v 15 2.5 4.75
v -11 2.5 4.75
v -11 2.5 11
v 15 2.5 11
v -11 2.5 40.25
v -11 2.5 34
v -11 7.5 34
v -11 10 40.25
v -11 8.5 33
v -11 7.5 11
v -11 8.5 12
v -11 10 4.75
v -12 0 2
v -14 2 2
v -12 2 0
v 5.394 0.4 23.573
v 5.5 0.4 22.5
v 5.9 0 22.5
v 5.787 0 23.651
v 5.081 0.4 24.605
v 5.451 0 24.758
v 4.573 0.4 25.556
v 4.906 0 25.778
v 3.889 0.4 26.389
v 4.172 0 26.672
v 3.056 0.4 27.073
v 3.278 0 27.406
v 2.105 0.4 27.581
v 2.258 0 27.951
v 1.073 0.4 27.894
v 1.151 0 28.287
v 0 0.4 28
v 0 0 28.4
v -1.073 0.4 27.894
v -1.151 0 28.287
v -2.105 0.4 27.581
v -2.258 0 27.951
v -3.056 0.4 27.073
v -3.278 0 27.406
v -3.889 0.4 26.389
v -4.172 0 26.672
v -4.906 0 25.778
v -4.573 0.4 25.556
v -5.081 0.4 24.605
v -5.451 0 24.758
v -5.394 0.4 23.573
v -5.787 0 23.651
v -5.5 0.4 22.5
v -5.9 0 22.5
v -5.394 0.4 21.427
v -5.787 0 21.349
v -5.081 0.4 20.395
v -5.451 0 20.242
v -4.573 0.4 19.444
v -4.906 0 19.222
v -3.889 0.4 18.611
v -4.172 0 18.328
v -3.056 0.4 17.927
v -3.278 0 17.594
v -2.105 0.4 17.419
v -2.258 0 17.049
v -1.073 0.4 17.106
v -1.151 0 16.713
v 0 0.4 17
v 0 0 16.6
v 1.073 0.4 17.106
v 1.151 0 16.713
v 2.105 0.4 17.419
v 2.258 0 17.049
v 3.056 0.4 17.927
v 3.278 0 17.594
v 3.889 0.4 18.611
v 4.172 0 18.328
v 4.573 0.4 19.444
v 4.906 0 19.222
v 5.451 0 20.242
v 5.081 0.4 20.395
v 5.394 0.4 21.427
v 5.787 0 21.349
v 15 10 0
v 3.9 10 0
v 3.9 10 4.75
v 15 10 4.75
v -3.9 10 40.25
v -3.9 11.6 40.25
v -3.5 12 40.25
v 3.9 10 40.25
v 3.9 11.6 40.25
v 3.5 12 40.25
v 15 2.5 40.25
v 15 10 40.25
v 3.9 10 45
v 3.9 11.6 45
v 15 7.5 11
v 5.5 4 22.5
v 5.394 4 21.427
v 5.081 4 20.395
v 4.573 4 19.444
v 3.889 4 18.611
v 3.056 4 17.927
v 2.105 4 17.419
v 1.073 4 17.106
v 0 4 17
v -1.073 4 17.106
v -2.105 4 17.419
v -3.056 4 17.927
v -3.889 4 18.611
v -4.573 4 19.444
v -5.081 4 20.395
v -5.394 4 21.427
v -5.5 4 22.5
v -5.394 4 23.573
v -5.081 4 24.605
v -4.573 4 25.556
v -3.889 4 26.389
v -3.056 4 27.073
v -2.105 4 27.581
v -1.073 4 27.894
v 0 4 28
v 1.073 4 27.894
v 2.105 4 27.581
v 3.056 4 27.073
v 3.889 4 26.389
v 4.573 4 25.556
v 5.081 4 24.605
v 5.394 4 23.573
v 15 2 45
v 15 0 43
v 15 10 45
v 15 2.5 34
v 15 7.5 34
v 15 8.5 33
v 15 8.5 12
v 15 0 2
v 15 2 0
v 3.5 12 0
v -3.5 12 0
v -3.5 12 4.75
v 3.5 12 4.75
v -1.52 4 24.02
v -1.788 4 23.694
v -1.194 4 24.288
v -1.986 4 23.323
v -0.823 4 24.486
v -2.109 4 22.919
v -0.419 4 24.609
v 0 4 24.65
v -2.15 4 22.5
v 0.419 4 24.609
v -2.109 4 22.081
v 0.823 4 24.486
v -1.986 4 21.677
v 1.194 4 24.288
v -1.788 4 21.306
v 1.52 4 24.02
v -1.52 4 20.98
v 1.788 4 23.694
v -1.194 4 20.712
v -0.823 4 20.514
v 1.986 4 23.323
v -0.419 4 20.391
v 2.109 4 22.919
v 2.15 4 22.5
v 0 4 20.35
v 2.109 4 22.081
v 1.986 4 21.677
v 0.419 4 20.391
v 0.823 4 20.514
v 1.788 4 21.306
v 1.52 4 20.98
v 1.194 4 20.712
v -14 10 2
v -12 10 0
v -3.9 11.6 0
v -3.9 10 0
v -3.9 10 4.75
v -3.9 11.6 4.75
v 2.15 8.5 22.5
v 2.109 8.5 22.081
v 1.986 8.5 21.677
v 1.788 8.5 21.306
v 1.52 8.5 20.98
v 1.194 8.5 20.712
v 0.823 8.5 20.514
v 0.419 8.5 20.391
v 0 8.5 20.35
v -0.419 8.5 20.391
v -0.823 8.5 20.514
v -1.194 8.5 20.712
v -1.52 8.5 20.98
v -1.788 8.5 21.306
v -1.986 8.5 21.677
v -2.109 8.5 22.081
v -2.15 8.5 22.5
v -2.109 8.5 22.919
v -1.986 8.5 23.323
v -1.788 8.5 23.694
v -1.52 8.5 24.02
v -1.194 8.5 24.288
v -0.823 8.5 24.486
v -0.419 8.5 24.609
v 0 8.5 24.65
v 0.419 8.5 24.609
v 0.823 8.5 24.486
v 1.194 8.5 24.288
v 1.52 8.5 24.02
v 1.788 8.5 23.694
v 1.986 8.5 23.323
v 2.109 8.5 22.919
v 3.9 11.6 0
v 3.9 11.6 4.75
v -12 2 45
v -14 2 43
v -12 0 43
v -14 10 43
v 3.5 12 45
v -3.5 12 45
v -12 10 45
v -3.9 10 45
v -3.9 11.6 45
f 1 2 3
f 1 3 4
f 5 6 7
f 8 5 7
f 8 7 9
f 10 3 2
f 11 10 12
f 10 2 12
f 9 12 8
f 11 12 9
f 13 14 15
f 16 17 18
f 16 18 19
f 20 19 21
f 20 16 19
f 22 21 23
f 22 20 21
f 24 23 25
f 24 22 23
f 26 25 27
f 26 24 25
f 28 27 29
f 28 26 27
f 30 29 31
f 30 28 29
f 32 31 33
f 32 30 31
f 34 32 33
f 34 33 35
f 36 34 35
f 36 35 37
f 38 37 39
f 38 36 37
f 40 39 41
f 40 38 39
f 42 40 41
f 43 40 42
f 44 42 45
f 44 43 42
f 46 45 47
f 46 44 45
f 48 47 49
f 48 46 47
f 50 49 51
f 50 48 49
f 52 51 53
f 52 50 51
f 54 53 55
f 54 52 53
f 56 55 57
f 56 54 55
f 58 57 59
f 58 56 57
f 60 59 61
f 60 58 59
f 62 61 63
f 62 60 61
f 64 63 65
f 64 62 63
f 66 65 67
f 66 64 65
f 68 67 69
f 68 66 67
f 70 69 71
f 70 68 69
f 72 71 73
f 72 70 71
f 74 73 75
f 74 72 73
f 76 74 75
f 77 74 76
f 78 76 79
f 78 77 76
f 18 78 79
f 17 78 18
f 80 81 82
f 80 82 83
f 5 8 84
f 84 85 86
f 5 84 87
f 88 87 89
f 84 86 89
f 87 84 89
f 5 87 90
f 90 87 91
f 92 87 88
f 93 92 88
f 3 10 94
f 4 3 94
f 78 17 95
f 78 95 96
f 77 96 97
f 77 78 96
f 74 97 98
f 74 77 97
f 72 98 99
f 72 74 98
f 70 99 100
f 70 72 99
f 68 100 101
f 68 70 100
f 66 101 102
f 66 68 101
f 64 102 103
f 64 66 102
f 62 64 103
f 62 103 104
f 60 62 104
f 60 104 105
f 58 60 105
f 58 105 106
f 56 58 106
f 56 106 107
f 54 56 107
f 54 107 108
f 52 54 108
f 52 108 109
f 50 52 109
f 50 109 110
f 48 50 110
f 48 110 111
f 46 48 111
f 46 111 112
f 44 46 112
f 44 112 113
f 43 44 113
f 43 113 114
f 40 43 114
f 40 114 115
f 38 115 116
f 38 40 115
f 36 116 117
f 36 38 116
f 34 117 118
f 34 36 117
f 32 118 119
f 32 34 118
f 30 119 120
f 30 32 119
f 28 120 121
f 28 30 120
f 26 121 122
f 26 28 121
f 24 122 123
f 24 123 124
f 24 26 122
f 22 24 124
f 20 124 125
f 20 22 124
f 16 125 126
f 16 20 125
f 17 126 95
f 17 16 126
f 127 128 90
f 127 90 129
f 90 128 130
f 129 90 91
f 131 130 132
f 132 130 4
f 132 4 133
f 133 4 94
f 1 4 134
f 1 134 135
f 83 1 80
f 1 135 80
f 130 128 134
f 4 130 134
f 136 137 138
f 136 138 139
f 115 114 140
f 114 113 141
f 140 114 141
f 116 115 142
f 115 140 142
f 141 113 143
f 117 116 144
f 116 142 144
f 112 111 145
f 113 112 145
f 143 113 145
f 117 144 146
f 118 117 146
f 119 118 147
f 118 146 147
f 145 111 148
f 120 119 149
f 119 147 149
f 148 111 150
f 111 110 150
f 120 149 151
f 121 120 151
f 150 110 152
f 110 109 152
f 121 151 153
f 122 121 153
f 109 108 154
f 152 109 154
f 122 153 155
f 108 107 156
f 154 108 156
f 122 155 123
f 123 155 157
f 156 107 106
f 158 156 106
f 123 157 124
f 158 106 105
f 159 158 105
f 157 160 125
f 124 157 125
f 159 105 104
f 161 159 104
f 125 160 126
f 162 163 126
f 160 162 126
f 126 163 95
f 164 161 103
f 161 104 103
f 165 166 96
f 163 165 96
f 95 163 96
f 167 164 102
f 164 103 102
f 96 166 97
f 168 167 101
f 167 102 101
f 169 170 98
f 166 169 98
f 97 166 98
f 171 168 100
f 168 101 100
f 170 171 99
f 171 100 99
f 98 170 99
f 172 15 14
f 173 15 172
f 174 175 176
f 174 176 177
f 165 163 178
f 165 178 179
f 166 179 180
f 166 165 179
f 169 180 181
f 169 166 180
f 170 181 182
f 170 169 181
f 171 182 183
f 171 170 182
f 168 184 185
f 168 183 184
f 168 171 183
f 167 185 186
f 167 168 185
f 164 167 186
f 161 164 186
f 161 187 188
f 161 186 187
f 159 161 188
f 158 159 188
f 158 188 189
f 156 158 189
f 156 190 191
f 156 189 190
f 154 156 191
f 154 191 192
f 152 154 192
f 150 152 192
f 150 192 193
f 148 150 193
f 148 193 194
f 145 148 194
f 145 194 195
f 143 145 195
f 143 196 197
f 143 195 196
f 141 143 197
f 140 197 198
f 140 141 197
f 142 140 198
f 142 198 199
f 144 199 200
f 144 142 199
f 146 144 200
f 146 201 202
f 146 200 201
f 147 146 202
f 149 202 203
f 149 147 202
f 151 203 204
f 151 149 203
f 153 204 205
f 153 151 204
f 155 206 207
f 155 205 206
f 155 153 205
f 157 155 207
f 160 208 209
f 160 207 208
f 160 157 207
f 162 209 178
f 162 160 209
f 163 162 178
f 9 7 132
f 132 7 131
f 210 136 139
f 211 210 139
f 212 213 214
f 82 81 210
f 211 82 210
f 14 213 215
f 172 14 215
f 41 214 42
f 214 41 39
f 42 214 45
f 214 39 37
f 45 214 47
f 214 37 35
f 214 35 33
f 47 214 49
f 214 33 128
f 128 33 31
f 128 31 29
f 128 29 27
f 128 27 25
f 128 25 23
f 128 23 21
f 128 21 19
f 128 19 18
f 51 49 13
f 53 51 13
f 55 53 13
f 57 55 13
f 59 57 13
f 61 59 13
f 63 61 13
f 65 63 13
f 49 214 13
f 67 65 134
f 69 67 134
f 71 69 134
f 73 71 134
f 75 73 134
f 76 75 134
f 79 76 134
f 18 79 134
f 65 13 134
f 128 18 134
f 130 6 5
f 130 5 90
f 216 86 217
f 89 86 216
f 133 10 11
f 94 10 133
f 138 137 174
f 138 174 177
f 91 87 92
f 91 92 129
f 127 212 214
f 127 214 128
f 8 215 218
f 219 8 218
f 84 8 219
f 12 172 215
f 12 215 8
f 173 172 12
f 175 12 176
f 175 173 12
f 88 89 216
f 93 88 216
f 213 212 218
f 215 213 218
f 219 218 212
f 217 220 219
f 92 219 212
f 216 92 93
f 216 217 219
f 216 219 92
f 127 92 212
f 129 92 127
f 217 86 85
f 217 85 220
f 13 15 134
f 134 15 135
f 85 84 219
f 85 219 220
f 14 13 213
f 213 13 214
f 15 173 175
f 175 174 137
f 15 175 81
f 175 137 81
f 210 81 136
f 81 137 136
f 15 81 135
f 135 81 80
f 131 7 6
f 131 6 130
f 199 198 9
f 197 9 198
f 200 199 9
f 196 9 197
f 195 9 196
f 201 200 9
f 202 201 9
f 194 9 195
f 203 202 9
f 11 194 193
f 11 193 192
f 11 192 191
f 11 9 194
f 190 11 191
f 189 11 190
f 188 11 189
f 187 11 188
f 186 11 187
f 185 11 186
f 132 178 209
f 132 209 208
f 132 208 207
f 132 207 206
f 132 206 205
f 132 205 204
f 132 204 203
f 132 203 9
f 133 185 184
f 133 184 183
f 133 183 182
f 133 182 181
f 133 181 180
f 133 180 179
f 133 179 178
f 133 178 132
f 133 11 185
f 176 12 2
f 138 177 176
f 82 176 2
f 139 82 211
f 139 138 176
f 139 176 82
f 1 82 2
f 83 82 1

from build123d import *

# Parameters (mm, degrees)
CYLINDER001_R     = 5.5
CYLINDER001_DEPTH = 10
CYLINDER_R        = 2.15
CYLINDER_DEPTH    = 10
BOX001_W          = 29
BOX001_H          = 7.5
BOX001_DEPTH      = 35.5
BOX_W             = 29
BOX_H             = 10
BOX_DEPTH         = 45
CHAMFER_SIZE      = 2
BOX003_W          = 7.8
BOX003_H          = 3
BOX003_DEPTH      = 4.75
BOX002_W          = 27
BOX002_H          = 6
BOX002_DEPTH      = 23
CHAMFER001_SIZE   = 1
BOX004_W          = 7.8
BOX004_H          = 3
BOX004_DEPTH      = 4.75
CHAMFER002_SIZE   = 0.4
CHAMFER003_SIZE   = 0.4


with BuildPart() as cylinder001:
    # Cylinder001 → Cylinder001 (new body)
    with BuildSketch(Plane(origin=(0, -6, 22.5), x_dir=(1, 0, 0), z_dir=(0, 1, 0))):
        Circle(CYLINDER001_R)
    extrude(amount=CYLINDER001_DEPTH)


with BuildPart() as cylinder:
    # Cylinder → Cylinder (new body)
    with BuildSketch(Plane(origin=(0, 0, 22.5), x_dir=(1, 0, 0), z_dir=(0, 1, 0))):
        Circle(CYLINDER_R)
    extrude(amount=CYLINDER_DEPTH)


with BuildPart() as cube001:
    # Box001 → Box001 (new body)
    with BuildSketch(Plane(origin=(-11, 2.5, 4.75), x_dir=(1, 0, 0), z_dir=(0, 0, 1))):
        with Locations((14.5, 3.75)):
            Rectangle(BOX001_W, BOX001_H)
    extrude(amount=BOX001_DEPTH)


with BuildPart() as chamfer_body:
    # Box → Box (new body)
    with BuildSketch(Plane(origin=(-14, 0, 0), x_dir=(1, 0, 0), z_dir=(0, 0, 1))):
        with Locations((14.5, 5)):
            Rectangle(BOX_W, BOX_H)
    extrude(amount=BOX_DEPTH)

    # Cut: cut Cube001
    add(cube001.part, mode=Mode.SUBTRACT)

    # Chamfer
    chamfer_edges = [chamfer_body.edges().sort_by_distance(p)[0] for p in [
        (-14, 0, 22.5),
        (-14, 5, 45),
        (-14, 5, 0),
        (0.5, 0, 0),
        (0.5, 0, 45),
    ]]
    chamfer(chamfer_edges, length=CHAMFER_SIZE)


with BuildPart() as cube003:
    # Box003 → Box003 (new body)
    with BuildSketch(Plane(origin=(-3.9, 9, 0), x_dir=(1, 0, 0), z_dir=(0, 0, 1))):
        with Locations((3.9, 1.5)):
            Rectangle(BOX003_W, BOX003_H)
    extrude(amount=BOX003_DEPTH)


with BuildPart() as chamfer001:
    # Box002 → Box002 (new body)
    with BuildSketch(Plane(origin=(-12, 2.5, 11), x_dir=(1, 0, 0), z_dir=(0, 0, 1))):
        with Locations((13.5, 3)):
            Rectangle(BOX002_W, BOX002_H)
    extrude(amount=BOX002_DEPTH)

    # Chamfer001
    chamfer001_edges = [chamfer001.edges().sort_by_distance(p)[0] for p in [
        (1.5, 8.5, 11),
        (1.5, 8.5, 34),
    ]]
    chamfer(chamfer001_edges, length=CHAMFER001_SIZE)


with BuildPart() as chamfer003:
    # Box004 → Box004 (new body)
    with BuildSketch(Plane(origin=(-3.9, 9, 40.25), x_dir=(1, 0, 0), z_dir=(0, 0, 1))):
        with Locations((3.9, 1.5)):
            Rectangle(BOX004_W, BOX004_H)
    extrude(amount=BOX004_DEPTH)

    # Fusion: union Cube003, Chamfer001
    add(cube003.part)
    add(chamfer001.part)

    # Chamfer002
    chamfer002_edges = [chamfer003.edges().sort_by_distance(p)[0] for p in [
        (-3.9, 12, 42.625),
        (3.9, 12, 42.625),
        (-3.9, 12, 2.375),
        (3.9, 12, 2.375),
    ]]
    chamfer(chamfer002_edges, length=CHAMFER002_SIZE)

    # Fusion001: union Chamfer body
    add(chamfer_body.part)

    # Cut001: cut Cylinder
    add(cylinder.part, mode=Mode.SUBTRACT)

    # Cut002: cut Cylinder001
    add(cylinder001.part, mode=Mode.SUBTRACT)

    # Chamfer003
    chamfer003_edges = [chamfer003.edges().sort_by_distance(p)[0] for p in [
        (-5.5, 0, 22.5),
    ]]
    chamfer(chamfer003_edges, length=CHAMFER003_SIZE)


solid = chamfer003.part
